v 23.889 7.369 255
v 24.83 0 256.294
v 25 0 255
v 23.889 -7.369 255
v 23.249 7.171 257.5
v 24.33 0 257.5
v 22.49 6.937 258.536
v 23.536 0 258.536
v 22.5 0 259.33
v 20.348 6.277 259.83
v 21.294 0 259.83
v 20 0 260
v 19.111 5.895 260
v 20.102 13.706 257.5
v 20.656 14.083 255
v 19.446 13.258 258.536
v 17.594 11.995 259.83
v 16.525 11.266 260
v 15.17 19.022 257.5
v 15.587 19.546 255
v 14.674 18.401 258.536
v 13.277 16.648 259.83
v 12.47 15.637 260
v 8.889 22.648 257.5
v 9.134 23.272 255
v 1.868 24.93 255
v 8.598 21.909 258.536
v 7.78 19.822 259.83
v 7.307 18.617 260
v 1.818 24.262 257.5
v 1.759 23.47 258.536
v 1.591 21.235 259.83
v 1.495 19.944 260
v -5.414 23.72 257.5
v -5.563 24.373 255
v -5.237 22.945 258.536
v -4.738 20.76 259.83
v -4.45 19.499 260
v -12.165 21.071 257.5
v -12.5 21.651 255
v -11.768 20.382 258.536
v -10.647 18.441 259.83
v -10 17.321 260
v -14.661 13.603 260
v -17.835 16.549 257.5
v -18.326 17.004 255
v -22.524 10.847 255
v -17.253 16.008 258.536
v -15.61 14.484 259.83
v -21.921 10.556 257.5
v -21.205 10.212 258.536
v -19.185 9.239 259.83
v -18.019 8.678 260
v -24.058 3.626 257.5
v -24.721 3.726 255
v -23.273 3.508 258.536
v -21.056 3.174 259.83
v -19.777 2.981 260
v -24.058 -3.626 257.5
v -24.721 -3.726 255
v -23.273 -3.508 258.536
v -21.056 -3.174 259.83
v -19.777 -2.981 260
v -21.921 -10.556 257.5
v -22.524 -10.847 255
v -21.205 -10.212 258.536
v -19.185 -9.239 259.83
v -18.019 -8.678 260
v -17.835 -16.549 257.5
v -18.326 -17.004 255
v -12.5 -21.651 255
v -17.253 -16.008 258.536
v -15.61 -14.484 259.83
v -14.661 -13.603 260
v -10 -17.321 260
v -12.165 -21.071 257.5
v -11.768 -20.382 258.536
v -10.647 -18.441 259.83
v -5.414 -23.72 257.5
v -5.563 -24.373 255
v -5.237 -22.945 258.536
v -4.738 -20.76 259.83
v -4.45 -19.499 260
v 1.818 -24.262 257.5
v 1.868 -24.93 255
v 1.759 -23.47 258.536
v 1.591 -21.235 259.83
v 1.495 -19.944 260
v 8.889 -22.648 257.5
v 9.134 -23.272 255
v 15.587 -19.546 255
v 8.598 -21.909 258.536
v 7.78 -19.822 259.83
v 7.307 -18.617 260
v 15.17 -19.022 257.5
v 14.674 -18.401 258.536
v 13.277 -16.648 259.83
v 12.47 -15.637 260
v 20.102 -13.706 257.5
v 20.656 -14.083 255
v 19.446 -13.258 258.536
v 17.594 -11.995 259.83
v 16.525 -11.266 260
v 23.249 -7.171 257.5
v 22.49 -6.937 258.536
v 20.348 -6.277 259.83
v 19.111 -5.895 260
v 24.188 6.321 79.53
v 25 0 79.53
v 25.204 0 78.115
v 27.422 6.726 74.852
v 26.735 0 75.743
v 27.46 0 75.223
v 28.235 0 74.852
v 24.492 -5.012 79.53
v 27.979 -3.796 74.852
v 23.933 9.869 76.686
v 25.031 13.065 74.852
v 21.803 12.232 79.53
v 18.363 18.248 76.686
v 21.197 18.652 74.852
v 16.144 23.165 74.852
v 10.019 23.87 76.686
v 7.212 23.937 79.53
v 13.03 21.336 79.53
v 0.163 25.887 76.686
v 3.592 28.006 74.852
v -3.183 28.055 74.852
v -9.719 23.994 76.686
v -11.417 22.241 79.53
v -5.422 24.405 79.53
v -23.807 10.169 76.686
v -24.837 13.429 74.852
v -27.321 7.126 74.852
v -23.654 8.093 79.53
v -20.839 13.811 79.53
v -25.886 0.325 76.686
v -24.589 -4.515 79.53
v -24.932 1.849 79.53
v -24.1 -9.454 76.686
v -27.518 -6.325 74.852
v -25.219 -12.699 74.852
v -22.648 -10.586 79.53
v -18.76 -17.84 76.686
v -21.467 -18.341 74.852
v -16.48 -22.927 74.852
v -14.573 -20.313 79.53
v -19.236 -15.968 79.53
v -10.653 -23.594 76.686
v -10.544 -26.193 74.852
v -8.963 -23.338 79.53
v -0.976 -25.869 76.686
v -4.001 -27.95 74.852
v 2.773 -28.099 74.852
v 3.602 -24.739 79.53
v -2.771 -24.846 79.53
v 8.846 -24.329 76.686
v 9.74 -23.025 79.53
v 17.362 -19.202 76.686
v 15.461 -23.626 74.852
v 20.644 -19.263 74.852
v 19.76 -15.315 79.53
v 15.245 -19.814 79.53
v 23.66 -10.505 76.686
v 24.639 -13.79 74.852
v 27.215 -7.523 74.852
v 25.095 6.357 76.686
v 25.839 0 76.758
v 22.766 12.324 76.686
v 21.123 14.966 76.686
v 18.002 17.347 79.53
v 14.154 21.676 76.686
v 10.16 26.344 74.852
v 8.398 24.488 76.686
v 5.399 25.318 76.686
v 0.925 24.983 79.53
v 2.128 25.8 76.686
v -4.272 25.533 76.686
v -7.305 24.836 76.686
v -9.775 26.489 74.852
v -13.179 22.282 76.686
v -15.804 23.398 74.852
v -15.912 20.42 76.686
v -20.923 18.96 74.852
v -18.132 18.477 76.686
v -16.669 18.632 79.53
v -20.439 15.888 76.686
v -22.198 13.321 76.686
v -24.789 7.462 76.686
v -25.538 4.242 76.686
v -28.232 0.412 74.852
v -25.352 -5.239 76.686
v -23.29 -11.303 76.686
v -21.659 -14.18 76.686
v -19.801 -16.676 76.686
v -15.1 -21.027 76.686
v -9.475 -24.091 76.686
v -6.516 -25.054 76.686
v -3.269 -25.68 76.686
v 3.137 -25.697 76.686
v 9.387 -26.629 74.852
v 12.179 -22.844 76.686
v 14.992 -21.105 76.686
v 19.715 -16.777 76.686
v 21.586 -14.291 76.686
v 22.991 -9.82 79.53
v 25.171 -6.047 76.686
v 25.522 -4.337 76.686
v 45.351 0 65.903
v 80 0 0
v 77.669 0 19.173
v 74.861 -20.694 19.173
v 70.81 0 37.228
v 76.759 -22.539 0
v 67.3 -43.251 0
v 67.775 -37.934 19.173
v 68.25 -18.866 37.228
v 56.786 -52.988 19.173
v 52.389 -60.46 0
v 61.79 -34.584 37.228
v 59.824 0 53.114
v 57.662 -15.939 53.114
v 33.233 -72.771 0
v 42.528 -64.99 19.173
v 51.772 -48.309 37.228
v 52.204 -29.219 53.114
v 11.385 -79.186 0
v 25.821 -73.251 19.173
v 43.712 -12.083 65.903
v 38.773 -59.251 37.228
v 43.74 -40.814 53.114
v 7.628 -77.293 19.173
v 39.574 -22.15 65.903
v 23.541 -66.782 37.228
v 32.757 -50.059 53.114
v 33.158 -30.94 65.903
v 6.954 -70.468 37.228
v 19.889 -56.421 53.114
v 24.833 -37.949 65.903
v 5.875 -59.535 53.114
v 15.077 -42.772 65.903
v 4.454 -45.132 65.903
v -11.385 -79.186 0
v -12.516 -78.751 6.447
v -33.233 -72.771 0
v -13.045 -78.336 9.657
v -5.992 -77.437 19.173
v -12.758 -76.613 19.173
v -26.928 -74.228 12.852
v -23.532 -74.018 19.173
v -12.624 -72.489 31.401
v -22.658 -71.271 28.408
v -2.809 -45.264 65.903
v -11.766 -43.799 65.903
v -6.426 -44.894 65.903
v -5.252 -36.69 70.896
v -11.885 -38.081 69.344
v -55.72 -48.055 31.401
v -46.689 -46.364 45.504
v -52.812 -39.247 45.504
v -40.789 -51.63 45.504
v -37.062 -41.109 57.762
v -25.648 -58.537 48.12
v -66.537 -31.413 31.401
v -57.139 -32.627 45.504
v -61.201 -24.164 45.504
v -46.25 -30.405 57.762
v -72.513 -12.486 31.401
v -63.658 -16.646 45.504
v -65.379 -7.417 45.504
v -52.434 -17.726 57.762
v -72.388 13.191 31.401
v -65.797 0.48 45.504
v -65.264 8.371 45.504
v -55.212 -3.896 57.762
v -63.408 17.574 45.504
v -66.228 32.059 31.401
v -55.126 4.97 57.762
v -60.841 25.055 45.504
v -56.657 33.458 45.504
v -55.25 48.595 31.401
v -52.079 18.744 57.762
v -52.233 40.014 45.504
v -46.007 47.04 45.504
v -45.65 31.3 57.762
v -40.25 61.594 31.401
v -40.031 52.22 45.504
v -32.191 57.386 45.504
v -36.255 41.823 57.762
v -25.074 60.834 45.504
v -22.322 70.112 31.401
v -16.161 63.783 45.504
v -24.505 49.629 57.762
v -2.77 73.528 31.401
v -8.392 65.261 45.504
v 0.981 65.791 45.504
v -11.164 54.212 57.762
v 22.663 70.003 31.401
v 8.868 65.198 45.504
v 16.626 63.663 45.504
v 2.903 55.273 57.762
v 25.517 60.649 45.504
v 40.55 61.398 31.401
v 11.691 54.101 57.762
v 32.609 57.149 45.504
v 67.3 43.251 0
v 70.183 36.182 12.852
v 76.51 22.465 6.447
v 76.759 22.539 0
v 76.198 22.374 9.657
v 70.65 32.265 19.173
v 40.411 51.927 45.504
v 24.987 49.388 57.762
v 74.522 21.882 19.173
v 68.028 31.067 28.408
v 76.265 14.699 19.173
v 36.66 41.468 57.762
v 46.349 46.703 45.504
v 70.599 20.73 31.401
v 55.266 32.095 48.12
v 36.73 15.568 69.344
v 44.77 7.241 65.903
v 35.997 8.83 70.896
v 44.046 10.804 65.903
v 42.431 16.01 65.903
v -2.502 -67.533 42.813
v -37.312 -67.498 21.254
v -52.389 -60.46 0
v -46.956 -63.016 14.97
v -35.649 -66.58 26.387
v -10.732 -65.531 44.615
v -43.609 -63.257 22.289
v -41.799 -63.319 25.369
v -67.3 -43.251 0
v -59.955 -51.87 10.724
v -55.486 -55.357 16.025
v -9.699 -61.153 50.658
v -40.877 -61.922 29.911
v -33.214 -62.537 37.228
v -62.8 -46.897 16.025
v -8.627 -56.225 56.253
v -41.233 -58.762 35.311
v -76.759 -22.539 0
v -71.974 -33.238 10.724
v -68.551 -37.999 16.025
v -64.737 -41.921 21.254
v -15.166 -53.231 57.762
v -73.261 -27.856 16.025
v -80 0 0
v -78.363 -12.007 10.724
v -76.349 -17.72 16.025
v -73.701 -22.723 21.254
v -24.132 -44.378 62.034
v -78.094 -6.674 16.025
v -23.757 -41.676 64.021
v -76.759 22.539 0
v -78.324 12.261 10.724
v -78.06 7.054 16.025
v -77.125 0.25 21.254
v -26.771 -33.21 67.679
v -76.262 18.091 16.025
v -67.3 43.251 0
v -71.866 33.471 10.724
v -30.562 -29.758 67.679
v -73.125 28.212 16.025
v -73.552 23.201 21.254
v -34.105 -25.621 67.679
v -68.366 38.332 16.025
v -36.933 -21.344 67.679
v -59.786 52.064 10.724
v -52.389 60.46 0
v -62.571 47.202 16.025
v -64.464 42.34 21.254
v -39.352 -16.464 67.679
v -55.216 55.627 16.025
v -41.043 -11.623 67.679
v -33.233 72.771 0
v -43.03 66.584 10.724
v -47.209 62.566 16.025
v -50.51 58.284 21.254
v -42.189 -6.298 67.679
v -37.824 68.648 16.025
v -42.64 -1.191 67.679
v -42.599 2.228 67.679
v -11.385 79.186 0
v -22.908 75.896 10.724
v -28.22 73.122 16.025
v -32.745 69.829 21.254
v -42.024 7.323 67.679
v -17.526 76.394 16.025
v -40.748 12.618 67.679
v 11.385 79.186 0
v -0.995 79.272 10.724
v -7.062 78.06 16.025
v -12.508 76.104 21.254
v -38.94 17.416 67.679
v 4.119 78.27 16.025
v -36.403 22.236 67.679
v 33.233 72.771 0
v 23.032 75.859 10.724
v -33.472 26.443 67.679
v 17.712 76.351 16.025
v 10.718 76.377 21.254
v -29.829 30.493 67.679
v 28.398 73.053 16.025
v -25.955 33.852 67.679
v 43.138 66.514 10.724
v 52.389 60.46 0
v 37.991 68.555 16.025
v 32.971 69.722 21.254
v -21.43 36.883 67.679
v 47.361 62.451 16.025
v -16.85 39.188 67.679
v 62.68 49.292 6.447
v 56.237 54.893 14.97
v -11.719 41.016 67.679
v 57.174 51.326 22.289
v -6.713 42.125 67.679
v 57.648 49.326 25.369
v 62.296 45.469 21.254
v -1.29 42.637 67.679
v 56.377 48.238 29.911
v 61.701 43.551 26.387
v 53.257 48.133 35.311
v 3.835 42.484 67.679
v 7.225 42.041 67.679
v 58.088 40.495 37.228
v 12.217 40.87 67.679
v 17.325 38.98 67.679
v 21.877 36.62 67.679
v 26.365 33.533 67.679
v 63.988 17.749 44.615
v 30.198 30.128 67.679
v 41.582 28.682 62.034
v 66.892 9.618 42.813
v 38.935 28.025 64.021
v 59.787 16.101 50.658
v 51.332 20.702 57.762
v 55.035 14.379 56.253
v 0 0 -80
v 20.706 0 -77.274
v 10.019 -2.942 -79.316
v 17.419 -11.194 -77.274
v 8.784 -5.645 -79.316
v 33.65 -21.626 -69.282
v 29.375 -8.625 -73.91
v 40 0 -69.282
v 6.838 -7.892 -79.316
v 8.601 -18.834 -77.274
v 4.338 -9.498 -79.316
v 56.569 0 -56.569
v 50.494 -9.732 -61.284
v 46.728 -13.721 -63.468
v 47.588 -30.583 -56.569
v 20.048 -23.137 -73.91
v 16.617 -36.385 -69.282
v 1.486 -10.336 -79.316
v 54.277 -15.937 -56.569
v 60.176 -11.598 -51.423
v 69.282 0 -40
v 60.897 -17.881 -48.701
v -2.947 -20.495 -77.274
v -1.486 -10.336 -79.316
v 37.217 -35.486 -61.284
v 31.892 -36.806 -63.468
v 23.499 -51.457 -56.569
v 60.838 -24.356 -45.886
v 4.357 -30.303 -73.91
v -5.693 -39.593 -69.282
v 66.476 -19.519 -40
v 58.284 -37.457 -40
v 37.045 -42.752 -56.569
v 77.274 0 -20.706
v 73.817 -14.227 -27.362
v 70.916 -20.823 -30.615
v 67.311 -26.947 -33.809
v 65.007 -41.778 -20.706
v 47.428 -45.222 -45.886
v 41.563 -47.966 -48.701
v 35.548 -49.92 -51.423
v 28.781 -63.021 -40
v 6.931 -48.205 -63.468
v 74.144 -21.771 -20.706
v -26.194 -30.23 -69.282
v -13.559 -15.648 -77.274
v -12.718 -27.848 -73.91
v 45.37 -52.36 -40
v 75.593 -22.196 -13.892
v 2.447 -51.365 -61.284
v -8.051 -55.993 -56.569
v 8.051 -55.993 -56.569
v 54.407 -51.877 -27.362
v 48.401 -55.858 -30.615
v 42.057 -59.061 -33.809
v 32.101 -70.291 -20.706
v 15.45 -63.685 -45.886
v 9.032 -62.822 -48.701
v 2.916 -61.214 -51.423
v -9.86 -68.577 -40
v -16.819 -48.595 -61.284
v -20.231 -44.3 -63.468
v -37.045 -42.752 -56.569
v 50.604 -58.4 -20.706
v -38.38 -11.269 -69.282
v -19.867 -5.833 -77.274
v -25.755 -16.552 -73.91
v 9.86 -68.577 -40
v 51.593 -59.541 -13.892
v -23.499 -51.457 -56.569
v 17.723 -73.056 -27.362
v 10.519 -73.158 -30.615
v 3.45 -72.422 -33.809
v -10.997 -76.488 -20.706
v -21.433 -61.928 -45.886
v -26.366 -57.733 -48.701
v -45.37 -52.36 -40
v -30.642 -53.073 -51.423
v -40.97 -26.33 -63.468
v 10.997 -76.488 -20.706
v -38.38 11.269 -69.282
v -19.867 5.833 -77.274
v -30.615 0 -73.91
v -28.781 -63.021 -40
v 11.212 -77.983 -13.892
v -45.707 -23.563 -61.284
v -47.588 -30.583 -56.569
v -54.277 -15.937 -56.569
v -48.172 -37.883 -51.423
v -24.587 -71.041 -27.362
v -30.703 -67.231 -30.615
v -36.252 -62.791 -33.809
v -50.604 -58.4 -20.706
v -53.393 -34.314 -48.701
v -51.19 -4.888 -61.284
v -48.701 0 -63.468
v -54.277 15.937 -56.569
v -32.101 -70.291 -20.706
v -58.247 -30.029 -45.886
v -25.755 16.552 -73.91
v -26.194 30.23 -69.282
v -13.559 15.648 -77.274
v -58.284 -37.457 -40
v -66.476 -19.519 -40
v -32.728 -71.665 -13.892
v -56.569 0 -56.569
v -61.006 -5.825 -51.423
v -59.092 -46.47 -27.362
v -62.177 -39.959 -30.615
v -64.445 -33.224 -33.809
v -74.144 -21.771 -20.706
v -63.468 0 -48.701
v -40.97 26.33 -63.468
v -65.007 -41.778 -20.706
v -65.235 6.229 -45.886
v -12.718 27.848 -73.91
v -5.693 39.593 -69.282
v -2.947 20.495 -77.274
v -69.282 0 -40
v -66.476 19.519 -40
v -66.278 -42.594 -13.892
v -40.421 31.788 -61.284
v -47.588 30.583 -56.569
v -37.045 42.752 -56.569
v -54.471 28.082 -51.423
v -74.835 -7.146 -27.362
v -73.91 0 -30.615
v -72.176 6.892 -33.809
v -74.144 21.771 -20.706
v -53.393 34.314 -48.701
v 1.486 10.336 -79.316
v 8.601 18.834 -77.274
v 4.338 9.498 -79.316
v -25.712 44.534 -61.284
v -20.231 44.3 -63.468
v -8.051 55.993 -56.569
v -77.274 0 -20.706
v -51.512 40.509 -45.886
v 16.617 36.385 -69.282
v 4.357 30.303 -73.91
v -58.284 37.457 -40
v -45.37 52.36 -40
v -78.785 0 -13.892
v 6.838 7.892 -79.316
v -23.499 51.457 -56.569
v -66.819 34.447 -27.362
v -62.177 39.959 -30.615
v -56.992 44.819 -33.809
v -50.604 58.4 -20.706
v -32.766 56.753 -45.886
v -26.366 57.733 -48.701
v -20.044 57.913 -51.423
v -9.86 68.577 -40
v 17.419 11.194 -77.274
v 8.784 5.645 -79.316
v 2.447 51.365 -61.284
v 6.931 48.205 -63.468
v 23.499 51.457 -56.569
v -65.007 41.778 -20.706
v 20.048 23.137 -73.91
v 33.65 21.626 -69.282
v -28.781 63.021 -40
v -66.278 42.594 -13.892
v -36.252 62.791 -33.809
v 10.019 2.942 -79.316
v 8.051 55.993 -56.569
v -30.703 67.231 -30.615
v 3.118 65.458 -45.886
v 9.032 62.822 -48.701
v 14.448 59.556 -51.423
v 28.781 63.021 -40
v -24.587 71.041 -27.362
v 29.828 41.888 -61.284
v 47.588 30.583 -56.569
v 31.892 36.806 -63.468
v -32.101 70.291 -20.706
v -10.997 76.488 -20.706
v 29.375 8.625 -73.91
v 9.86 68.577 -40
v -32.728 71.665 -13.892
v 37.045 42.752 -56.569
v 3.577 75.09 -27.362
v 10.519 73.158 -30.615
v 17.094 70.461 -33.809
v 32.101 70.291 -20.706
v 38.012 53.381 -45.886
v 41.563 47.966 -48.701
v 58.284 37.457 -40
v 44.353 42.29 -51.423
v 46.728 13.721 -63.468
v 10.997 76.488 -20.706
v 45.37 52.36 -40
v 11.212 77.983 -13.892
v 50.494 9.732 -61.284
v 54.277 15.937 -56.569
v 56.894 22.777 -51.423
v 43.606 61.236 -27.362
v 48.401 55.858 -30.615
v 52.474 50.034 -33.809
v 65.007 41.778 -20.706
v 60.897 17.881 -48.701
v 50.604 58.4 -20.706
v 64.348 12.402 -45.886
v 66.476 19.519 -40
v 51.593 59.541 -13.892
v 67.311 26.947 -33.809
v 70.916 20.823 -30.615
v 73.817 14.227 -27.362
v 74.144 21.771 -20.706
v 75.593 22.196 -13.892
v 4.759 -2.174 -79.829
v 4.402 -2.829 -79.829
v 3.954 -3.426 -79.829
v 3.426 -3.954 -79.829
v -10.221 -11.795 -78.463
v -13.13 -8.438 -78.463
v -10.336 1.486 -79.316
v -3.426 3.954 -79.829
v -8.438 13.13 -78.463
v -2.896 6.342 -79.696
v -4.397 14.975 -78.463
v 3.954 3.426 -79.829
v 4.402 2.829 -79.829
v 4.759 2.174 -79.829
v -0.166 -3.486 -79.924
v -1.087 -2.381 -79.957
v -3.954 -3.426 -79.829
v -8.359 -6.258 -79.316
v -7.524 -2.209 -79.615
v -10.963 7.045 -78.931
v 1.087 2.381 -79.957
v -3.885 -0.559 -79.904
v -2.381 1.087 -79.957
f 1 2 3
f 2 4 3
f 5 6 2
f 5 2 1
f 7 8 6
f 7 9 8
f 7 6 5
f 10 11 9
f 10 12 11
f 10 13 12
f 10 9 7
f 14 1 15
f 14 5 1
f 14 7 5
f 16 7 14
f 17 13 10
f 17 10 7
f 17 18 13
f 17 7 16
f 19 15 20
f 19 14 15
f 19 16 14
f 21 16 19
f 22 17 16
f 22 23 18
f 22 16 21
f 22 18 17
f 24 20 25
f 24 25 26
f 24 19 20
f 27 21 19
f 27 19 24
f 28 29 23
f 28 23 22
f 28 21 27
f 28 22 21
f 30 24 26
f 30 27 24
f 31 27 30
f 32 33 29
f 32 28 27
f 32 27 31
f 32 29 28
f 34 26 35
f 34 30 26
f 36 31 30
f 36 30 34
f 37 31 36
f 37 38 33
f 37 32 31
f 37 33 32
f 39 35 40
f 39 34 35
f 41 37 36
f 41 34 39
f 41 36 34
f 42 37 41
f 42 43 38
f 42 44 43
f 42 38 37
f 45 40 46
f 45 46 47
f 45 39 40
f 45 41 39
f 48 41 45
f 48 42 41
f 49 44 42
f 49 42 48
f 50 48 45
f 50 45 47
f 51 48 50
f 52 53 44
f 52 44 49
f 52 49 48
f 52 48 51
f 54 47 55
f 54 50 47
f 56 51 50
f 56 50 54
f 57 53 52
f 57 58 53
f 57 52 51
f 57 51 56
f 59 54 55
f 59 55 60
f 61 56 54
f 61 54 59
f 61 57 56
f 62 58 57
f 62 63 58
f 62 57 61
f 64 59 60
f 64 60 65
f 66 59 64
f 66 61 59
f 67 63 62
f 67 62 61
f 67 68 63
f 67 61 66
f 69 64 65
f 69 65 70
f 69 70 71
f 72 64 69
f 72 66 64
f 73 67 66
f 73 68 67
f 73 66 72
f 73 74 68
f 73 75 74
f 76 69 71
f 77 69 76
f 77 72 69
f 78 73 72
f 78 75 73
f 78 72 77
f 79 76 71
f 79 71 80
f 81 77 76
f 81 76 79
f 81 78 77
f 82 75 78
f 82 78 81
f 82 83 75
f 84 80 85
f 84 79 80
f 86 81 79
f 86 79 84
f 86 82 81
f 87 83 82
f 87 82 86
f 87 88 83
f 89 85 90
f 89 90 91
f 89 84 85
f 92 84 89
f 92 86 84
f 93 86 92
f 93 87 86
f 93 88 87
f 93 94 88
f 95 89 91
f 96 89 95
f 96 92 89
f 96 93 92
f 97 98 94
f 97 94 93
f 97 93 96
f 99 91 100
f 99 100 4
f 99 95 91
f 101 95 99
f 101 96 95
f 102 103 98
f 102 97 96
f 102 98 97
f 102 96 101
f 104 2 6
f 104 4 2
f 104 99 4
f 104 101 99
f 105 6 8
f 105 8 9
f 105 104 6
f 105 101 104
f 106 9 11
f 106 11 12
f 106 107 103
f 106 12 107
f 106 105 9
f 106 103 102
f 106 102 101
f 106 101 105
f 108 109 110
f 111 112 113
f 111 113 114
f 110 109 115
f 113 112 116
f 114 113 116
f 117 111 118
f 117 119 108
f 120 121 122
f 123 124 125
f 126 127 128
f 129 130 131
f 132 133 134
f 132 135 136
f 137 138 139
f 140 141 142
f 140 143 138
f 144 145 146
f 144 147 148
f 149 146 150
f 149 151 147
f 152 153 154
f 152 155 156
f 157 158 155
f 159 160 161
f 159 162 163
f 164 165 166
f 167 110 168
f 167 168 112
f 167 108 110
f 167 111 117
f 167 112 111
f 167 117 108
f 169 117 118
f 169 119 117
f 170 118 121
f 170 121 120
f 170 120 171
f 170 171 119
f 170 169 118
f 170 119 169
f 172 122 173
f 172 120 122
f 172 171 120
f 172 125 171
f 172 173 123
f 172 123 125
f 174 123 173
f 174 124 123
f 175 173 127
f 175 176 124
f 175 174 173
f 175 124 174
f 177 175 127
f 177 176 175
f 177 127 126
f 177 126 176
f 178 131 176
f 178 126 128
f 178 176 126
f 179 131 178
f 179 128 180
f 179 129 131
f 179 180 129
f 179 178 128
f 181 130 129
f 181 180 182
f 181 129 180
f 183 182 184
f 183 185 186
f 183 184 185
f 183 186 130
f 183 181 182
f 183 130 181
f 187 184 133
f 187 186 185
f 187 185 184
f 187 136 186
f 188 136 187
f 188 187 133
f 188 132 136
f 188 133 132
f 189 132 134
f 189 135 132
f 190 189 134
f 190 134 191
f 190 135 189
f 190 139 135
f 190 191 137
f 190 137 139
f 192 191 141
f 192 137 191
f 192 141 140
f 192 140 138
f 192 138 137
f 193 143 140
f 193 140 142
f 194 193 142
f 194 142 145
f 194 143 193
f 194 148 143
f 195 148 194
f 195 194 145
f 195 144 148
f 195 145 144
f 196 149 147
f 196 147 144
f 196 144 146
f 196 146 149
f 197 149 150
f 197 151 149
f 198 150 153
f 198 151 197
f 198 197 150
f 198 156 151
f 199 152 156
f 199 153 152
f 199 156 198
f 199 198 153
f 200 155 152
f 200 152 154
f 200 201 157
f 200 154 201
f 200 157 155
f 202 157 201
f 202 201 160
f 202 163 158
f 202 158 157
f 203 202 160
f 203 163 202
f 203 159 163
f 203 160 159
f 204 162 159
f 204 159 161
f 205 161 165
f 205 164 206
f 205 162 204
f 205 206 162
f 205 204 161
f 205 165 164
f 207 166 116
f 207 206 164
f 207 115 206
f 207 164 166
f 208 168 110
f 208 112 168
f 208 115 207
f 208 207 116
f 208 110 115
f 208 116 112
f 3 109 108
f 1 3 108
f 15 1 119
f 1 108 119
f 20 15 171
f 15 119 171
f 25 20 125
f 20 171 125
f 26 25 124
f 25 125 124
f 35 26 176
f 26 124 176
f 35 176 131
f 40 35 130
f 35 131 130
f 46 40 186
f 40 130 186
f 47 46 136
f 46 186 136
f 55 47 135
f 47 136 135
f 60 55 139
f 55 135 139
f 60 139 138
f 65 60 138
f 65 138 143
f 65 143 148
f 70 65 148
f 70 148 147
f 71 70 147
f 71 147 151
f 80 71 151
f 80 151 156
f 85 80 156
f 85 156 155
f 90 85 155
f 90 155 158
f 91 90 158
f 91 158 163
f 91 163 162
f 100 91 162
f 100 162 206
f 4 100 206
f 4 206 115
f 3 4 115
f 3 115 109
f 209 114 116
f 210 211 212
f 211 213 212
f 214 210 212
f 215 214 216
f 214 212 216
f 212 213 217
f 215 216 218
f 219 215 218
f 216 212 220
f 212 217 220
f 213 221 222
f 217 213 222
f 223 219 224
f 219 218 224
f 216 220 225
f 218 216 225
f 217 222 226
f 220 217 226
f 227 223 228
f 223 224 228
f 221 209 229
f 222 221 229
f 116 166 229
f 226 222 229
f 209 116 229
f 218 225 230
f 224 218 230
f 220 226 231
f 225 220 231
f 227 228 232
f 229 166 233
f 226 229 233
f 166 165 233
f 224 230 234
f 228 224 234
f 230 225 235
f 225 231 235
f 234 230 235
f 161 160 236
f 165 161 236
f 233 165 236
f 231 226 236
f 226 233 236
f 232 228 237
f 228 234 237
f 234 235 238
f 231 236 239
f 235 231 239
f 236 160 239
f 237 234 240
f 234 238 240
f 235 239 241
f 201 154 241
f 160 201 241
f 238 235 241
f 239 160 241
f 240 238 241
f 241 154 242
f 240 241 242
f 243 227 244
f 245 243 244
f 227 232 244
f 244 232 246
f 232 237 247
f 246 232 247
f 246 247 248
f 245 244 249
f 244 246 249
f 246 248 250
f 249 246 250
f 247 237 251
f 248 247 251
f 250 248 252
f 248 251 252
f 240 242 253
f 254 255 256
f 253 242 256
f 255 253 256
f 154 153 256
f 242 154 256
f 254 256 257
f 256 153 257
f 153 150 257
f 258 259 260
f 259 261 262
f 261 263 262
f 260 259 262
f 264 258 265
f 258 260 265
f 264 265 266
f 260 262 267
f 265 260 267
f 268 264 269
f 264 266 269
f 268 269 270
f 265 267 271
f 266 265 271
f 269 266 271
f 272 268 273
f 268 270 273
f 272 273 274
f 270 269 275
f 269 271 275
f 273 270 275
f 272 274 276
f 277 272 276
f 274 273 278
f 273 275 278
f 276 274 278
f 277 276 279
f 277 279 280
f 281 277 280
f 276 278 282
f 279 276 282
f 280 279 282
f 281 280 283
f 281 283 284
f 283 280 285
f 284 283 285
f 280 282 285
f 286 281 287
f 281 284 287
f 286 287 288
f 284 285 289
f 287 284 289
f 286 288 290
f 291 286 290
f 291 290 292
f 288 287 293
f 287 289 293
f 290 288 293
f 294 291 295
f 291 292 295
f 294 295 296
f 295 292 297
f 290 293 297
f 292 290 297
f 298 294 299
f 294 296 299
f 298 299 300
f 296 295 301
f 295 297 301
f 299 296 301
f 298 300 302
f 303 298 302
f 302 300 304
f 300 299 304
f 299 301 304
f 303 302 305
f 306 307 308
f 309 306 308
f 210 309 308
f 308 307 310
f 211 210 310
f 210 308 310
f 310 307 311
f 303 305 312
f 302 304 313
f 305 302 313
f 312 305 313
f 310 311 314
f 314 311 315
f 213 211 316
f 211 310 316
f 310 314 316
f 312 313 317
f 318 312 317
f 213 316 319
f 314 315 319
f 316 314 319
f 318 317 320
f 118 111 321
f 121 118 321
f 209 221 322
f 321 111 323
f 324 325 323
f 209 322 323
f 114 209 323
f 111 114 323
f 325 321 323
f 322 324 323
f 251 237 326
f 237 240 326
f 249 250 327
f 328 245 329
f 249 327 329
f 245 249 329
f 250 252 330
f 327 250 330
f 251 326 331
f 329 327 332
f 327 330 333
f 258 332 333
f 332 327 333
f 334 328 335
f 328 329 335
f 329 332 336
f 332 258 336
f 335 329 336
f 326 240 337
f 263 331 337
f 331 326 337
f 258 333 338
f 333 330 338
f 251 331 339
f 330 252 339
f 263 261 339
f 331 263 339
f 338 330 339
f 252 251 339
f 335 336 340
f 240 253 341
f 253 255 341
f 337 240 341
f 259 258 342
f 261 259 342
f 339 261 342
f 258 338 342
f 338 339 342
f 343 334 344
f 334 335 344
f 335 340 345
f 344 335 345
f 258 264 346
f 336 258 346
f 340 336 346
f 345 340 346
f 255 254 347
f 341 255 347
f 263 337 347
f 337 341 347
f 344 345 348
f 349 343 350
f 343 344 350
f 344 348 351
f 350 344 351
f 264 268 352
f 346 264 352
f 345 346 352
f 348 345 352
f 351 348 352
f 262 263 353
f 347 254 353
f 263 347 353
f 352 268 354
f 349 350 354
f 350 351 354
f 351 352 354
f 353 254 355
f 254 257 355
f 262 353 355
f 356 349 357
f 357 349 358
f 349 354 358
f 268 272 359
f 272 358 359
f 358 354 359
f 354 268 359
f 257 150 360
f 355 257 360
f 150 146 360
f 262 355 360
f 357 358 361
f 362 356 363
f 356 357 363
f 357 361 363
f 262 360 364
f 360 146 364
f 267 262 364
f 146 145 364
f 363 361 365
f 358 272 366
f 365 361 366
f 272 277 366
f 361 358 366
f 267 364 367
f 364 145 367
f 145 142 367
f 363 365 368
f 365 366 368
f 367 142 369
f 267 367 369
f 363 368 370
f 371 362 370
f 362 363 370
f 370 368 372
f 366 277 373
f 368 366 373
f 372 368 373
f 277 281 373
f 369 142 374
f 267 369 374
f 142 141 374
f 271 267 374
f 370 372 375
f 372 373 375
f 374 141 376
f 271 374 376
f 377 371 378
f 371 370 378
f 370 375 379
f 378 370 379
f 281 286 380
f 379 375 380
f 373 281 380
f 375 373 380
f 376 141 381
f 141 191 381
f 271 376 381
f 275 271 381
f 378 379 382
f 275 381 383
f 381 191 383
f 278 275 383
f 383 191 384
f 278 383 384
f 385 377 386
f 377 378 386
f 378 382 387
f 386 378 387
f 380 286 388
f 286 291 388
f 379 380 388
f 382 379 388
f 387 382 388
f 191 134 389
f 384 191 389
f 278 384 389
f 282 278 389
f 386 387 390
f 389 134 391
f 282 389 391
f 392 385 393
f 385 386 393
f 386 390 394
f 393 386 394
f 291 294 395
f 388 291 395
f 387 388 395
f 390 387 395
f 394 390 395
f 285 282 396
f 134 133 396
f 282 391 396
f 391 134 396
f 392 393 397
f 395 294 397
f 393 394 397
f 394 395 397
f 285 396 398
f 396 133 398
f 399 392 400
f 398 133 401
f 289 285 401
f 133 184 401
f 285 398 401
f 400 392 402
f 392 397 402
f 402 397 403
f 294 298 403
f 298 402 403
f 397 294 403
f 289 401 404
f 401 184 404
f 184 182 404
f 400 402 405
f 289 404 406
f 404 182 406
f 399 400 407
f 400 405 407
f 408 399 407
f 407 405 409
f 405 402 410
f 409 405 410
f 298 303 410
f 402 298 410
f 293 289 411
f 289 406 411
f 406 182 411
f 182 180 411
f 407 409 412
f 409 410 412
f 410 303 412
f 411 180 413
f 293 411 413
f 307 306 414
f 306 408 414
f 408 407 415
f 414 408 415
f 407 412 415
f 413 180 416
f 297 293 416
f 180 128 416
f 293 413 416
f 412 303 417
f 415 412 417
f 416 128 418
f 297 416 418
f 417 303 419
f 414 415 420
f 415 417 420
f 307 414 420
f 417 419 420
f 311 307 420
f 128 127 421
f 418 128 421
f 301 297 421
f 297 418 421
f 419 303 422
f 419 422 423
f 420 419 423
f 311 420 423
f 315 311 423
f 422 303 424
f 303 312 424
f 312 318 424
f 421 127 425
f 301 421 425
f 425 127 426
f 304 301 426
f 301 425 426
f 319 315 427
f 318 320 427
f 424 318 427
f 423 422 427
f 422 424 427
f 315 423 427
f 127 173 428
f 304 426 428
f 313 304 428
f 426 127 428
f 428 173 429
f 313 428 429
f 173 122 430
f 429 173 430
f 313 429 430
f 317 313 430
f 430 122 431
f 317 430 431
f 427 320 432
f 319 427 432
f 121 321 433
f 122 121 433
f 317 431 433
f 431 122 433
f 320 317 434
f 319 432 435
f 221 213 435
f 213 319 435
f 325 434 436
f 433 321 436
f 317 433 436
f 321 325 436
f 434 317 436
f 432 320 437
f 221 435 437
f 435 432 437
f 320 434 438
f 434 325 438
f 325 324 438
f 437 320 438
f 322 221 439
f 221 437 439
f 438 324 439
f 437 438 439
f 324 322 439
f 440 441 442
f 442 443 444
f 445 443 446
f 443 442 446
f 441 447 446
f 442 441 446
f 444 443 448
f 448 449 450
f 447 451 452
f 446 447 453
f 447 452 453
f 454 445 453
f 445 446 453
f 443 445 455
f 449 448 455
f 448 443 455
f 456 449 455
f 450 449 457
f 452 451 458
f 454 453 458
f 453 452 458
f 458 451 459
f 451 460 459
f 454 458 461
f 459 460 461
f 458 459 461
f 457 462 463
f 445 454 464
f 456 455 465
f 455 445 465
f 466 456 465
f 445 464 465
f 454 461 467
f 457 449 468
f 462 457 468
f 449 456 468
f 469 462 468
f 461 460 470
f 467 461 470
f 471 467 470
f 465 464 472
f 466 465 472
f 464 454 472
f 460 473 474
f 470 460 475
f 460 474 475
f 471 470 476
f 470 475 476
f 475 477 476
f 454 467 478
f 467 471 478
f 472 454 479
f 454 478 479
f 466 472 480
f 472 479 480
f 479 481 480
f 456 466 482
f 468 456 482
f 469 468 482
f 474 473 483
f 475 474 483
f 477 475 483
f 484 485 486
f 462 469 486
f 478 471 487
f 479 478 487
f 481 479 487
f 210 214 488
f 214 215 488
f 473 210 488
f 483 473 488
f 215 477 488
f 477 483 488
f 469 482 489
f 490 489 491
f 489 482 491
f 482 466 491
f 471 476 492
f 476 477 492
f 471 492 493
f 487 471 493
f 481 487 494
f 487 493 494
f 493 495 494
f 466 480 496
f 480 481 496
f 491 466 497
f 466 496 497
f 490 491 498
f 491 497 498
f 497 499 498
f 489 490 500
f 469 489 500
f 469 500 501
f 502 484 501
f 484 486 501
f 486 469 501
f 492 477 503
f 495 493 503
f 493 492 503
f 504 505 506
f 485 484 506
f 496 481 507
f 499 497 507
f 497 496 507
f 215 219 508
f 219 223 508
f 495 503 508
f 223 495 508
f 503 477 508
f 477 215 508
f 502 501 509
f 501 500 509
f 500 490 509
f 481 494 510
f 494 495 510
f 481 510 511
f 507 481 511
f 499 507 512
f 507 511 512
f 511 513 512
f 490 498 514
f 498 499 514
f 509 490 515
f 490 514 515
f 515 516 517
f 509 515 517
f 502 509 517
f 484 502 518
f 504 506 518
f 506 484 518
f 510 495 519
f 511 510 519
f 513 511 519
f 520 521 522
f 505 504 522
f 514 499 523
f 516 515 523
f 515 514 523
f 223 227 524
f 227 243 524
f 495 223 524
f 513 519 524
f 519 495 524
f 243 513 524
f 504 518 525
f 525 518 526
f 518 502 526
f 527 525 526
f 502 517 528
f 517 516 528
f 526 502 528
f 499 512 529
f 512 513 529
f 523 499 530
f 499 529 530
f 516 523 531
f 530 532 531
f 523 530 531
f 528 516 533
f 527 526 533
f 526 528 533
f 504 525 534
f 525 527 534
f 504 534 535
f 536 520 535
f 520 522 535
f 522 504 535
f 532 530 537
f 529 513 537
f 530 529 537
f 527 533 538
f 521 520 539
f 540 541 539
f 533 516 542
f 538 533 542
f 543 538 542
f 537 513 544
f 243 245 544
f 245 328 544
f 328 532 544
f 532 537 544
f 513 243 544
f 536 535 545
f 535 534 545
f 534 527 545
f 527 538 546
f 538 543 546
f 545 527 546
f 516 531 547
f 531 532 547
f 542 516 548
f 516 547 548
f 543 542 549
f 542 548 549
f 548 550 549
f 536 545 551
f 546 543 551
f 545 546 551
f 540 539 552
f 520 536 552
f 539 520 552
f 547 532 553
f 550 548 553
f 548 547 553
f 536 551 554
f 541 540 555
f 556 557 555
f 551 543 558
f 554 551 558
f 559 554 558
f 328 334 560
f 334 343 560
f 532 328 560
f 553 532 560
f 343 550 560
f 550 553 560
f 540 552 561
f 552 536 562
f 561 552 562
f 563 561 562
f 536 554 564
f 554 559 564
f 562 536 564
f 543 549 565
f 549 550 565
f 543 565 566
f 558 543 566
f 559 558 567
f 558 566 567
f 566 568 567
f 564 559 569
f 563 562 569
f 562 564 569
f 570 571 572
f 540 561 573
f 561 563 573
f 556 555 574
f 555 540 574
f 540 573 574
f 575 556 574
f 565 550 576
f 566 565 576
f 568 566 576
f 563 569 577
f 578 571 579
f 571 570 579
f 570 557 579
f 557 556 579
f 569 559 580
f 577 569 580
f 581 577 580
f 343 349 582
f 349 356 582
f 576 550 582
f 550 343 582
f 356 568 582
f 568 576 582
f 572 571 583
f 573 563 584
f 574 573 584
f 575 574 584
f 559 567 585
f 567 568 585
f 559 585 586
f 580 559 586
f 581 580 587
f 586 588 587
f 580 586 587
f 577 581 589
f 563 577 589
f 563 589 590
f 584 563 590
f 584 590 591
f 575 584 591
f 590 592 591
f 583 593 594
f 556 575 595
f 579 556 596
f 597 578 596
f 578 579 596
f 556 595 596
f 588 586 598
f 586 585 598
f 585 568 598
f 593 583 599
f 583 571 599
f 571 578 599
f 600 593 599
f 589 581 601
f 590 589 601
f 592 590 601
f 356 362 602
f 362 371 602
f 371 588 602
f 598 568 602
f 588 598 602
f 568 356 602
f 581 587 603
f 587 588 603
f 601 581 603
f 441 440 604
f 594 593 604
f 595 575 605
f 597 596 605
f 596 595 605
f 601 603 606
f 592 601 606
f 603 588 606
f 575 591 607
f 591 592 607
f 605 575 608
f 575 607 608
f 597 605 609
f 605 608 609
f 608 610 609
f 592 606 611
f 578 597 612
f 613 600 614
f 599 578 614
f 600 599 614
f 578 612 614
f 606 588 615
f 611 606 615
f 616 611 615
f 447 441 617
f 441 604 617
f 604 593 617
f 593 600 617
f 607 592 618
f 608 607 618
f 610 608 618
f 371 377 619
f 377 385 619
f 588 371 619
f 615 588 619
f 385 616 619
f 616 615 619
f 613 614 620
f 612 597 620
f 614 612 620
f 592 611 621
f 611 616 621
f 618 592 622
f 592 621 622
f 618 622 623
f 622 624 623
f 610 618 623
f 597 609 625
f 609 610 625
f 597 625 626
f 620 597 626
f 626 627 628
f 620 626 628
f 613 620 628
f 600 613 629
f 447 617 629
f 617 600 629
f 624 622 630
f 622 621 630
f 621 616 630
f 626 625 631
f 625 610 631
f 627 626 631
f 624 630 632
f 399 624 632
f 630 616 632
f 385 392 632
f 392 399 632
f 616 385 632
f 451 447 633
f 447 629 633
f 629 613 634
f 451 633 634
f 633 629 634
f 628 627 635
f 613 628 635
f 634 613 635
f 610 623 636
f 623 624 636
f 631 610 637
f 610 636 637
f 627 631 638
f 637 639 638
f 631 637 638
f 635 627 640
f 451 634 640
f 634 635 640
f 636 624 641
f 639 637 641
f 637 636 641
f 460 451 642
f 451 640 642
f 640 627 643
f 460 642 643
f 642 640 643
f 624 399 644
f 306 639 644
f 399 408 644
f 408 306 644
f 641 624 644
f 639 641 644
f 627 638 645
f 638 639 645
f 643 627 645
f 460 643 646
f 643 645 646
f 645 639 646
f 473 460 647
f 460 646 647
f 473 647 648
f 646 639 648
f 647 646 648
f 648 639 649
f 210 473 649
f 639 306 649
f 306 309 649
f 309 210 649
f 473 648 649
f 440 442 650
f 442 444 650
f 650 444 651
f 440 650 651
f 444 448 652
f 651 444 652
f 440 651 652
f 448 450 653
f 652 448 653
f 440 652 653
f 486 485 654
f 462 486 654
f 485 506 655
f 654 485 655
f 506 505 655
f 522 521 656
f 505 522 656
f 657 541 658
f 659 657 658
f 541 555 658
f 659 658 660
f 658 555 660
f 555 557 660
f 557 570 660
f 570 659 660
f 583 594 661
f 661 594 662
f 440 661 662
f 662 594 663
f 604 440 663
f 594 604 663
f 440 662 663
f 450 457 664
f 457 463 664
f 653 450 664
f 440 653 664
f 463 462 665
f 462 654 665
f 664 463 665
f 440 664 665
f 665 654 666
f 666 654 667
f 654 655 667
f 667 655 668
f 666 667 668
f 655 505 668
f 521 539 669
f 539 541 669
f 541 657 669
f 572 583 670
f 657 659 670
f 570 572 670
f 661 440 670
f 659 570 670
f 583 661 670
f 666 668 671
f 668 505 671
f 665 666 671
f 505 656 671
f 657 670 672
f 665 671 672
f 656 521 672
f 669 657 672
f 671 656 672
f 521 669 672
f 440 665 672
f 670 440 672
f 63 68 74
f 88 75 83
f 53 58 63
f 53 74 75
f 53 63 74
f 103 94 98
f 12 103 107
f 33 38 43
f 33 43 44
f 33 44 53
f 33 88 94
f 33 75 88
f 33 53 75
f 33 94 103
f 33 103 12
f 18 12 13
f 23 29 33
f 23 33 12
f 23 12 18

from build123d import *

# Parameters (mm, degrees)
F2_R     = 25
F3_DEPTH = 260
F4_R     = 5
F5_R     = 5


with BuildPart() as f1:
    # F0 (on Front) → F1 (revolve)
    with BuildSketch(Plane.XZ):
        with BuildLine():
            ThreePointArc((0, -80), (56.568542, -56.568542), (80, 0))
            ThreePointArc((80, 0), (56.568542, 56.568542), (0, 80))
            Line((0, 80), (0, -80))
        make_face()
    revolve(axis=Axis((0, 0, 0), (0, 0, -1)))

    # F2 (on Top) → F3 (join)
    with BuildSketch(Plane.XY):
        Circle(F2_R)
    extrude(amount=F3_DEPTH)

    # F4
    f4_edges = [f1.edges().sort_by_distance(p)[0] for p in [
        (-25, 0, 260),
    ]]
    fillet(f4_edges, radius=F4_R)

    # F5
    f5_edges = [f1.edges().sort_by_distance(p)[0] for p in [
        (-25, 0, 75.993421),
    ]]
    fillet(f5_edges, radius=F5_R)


solid = f1.part
